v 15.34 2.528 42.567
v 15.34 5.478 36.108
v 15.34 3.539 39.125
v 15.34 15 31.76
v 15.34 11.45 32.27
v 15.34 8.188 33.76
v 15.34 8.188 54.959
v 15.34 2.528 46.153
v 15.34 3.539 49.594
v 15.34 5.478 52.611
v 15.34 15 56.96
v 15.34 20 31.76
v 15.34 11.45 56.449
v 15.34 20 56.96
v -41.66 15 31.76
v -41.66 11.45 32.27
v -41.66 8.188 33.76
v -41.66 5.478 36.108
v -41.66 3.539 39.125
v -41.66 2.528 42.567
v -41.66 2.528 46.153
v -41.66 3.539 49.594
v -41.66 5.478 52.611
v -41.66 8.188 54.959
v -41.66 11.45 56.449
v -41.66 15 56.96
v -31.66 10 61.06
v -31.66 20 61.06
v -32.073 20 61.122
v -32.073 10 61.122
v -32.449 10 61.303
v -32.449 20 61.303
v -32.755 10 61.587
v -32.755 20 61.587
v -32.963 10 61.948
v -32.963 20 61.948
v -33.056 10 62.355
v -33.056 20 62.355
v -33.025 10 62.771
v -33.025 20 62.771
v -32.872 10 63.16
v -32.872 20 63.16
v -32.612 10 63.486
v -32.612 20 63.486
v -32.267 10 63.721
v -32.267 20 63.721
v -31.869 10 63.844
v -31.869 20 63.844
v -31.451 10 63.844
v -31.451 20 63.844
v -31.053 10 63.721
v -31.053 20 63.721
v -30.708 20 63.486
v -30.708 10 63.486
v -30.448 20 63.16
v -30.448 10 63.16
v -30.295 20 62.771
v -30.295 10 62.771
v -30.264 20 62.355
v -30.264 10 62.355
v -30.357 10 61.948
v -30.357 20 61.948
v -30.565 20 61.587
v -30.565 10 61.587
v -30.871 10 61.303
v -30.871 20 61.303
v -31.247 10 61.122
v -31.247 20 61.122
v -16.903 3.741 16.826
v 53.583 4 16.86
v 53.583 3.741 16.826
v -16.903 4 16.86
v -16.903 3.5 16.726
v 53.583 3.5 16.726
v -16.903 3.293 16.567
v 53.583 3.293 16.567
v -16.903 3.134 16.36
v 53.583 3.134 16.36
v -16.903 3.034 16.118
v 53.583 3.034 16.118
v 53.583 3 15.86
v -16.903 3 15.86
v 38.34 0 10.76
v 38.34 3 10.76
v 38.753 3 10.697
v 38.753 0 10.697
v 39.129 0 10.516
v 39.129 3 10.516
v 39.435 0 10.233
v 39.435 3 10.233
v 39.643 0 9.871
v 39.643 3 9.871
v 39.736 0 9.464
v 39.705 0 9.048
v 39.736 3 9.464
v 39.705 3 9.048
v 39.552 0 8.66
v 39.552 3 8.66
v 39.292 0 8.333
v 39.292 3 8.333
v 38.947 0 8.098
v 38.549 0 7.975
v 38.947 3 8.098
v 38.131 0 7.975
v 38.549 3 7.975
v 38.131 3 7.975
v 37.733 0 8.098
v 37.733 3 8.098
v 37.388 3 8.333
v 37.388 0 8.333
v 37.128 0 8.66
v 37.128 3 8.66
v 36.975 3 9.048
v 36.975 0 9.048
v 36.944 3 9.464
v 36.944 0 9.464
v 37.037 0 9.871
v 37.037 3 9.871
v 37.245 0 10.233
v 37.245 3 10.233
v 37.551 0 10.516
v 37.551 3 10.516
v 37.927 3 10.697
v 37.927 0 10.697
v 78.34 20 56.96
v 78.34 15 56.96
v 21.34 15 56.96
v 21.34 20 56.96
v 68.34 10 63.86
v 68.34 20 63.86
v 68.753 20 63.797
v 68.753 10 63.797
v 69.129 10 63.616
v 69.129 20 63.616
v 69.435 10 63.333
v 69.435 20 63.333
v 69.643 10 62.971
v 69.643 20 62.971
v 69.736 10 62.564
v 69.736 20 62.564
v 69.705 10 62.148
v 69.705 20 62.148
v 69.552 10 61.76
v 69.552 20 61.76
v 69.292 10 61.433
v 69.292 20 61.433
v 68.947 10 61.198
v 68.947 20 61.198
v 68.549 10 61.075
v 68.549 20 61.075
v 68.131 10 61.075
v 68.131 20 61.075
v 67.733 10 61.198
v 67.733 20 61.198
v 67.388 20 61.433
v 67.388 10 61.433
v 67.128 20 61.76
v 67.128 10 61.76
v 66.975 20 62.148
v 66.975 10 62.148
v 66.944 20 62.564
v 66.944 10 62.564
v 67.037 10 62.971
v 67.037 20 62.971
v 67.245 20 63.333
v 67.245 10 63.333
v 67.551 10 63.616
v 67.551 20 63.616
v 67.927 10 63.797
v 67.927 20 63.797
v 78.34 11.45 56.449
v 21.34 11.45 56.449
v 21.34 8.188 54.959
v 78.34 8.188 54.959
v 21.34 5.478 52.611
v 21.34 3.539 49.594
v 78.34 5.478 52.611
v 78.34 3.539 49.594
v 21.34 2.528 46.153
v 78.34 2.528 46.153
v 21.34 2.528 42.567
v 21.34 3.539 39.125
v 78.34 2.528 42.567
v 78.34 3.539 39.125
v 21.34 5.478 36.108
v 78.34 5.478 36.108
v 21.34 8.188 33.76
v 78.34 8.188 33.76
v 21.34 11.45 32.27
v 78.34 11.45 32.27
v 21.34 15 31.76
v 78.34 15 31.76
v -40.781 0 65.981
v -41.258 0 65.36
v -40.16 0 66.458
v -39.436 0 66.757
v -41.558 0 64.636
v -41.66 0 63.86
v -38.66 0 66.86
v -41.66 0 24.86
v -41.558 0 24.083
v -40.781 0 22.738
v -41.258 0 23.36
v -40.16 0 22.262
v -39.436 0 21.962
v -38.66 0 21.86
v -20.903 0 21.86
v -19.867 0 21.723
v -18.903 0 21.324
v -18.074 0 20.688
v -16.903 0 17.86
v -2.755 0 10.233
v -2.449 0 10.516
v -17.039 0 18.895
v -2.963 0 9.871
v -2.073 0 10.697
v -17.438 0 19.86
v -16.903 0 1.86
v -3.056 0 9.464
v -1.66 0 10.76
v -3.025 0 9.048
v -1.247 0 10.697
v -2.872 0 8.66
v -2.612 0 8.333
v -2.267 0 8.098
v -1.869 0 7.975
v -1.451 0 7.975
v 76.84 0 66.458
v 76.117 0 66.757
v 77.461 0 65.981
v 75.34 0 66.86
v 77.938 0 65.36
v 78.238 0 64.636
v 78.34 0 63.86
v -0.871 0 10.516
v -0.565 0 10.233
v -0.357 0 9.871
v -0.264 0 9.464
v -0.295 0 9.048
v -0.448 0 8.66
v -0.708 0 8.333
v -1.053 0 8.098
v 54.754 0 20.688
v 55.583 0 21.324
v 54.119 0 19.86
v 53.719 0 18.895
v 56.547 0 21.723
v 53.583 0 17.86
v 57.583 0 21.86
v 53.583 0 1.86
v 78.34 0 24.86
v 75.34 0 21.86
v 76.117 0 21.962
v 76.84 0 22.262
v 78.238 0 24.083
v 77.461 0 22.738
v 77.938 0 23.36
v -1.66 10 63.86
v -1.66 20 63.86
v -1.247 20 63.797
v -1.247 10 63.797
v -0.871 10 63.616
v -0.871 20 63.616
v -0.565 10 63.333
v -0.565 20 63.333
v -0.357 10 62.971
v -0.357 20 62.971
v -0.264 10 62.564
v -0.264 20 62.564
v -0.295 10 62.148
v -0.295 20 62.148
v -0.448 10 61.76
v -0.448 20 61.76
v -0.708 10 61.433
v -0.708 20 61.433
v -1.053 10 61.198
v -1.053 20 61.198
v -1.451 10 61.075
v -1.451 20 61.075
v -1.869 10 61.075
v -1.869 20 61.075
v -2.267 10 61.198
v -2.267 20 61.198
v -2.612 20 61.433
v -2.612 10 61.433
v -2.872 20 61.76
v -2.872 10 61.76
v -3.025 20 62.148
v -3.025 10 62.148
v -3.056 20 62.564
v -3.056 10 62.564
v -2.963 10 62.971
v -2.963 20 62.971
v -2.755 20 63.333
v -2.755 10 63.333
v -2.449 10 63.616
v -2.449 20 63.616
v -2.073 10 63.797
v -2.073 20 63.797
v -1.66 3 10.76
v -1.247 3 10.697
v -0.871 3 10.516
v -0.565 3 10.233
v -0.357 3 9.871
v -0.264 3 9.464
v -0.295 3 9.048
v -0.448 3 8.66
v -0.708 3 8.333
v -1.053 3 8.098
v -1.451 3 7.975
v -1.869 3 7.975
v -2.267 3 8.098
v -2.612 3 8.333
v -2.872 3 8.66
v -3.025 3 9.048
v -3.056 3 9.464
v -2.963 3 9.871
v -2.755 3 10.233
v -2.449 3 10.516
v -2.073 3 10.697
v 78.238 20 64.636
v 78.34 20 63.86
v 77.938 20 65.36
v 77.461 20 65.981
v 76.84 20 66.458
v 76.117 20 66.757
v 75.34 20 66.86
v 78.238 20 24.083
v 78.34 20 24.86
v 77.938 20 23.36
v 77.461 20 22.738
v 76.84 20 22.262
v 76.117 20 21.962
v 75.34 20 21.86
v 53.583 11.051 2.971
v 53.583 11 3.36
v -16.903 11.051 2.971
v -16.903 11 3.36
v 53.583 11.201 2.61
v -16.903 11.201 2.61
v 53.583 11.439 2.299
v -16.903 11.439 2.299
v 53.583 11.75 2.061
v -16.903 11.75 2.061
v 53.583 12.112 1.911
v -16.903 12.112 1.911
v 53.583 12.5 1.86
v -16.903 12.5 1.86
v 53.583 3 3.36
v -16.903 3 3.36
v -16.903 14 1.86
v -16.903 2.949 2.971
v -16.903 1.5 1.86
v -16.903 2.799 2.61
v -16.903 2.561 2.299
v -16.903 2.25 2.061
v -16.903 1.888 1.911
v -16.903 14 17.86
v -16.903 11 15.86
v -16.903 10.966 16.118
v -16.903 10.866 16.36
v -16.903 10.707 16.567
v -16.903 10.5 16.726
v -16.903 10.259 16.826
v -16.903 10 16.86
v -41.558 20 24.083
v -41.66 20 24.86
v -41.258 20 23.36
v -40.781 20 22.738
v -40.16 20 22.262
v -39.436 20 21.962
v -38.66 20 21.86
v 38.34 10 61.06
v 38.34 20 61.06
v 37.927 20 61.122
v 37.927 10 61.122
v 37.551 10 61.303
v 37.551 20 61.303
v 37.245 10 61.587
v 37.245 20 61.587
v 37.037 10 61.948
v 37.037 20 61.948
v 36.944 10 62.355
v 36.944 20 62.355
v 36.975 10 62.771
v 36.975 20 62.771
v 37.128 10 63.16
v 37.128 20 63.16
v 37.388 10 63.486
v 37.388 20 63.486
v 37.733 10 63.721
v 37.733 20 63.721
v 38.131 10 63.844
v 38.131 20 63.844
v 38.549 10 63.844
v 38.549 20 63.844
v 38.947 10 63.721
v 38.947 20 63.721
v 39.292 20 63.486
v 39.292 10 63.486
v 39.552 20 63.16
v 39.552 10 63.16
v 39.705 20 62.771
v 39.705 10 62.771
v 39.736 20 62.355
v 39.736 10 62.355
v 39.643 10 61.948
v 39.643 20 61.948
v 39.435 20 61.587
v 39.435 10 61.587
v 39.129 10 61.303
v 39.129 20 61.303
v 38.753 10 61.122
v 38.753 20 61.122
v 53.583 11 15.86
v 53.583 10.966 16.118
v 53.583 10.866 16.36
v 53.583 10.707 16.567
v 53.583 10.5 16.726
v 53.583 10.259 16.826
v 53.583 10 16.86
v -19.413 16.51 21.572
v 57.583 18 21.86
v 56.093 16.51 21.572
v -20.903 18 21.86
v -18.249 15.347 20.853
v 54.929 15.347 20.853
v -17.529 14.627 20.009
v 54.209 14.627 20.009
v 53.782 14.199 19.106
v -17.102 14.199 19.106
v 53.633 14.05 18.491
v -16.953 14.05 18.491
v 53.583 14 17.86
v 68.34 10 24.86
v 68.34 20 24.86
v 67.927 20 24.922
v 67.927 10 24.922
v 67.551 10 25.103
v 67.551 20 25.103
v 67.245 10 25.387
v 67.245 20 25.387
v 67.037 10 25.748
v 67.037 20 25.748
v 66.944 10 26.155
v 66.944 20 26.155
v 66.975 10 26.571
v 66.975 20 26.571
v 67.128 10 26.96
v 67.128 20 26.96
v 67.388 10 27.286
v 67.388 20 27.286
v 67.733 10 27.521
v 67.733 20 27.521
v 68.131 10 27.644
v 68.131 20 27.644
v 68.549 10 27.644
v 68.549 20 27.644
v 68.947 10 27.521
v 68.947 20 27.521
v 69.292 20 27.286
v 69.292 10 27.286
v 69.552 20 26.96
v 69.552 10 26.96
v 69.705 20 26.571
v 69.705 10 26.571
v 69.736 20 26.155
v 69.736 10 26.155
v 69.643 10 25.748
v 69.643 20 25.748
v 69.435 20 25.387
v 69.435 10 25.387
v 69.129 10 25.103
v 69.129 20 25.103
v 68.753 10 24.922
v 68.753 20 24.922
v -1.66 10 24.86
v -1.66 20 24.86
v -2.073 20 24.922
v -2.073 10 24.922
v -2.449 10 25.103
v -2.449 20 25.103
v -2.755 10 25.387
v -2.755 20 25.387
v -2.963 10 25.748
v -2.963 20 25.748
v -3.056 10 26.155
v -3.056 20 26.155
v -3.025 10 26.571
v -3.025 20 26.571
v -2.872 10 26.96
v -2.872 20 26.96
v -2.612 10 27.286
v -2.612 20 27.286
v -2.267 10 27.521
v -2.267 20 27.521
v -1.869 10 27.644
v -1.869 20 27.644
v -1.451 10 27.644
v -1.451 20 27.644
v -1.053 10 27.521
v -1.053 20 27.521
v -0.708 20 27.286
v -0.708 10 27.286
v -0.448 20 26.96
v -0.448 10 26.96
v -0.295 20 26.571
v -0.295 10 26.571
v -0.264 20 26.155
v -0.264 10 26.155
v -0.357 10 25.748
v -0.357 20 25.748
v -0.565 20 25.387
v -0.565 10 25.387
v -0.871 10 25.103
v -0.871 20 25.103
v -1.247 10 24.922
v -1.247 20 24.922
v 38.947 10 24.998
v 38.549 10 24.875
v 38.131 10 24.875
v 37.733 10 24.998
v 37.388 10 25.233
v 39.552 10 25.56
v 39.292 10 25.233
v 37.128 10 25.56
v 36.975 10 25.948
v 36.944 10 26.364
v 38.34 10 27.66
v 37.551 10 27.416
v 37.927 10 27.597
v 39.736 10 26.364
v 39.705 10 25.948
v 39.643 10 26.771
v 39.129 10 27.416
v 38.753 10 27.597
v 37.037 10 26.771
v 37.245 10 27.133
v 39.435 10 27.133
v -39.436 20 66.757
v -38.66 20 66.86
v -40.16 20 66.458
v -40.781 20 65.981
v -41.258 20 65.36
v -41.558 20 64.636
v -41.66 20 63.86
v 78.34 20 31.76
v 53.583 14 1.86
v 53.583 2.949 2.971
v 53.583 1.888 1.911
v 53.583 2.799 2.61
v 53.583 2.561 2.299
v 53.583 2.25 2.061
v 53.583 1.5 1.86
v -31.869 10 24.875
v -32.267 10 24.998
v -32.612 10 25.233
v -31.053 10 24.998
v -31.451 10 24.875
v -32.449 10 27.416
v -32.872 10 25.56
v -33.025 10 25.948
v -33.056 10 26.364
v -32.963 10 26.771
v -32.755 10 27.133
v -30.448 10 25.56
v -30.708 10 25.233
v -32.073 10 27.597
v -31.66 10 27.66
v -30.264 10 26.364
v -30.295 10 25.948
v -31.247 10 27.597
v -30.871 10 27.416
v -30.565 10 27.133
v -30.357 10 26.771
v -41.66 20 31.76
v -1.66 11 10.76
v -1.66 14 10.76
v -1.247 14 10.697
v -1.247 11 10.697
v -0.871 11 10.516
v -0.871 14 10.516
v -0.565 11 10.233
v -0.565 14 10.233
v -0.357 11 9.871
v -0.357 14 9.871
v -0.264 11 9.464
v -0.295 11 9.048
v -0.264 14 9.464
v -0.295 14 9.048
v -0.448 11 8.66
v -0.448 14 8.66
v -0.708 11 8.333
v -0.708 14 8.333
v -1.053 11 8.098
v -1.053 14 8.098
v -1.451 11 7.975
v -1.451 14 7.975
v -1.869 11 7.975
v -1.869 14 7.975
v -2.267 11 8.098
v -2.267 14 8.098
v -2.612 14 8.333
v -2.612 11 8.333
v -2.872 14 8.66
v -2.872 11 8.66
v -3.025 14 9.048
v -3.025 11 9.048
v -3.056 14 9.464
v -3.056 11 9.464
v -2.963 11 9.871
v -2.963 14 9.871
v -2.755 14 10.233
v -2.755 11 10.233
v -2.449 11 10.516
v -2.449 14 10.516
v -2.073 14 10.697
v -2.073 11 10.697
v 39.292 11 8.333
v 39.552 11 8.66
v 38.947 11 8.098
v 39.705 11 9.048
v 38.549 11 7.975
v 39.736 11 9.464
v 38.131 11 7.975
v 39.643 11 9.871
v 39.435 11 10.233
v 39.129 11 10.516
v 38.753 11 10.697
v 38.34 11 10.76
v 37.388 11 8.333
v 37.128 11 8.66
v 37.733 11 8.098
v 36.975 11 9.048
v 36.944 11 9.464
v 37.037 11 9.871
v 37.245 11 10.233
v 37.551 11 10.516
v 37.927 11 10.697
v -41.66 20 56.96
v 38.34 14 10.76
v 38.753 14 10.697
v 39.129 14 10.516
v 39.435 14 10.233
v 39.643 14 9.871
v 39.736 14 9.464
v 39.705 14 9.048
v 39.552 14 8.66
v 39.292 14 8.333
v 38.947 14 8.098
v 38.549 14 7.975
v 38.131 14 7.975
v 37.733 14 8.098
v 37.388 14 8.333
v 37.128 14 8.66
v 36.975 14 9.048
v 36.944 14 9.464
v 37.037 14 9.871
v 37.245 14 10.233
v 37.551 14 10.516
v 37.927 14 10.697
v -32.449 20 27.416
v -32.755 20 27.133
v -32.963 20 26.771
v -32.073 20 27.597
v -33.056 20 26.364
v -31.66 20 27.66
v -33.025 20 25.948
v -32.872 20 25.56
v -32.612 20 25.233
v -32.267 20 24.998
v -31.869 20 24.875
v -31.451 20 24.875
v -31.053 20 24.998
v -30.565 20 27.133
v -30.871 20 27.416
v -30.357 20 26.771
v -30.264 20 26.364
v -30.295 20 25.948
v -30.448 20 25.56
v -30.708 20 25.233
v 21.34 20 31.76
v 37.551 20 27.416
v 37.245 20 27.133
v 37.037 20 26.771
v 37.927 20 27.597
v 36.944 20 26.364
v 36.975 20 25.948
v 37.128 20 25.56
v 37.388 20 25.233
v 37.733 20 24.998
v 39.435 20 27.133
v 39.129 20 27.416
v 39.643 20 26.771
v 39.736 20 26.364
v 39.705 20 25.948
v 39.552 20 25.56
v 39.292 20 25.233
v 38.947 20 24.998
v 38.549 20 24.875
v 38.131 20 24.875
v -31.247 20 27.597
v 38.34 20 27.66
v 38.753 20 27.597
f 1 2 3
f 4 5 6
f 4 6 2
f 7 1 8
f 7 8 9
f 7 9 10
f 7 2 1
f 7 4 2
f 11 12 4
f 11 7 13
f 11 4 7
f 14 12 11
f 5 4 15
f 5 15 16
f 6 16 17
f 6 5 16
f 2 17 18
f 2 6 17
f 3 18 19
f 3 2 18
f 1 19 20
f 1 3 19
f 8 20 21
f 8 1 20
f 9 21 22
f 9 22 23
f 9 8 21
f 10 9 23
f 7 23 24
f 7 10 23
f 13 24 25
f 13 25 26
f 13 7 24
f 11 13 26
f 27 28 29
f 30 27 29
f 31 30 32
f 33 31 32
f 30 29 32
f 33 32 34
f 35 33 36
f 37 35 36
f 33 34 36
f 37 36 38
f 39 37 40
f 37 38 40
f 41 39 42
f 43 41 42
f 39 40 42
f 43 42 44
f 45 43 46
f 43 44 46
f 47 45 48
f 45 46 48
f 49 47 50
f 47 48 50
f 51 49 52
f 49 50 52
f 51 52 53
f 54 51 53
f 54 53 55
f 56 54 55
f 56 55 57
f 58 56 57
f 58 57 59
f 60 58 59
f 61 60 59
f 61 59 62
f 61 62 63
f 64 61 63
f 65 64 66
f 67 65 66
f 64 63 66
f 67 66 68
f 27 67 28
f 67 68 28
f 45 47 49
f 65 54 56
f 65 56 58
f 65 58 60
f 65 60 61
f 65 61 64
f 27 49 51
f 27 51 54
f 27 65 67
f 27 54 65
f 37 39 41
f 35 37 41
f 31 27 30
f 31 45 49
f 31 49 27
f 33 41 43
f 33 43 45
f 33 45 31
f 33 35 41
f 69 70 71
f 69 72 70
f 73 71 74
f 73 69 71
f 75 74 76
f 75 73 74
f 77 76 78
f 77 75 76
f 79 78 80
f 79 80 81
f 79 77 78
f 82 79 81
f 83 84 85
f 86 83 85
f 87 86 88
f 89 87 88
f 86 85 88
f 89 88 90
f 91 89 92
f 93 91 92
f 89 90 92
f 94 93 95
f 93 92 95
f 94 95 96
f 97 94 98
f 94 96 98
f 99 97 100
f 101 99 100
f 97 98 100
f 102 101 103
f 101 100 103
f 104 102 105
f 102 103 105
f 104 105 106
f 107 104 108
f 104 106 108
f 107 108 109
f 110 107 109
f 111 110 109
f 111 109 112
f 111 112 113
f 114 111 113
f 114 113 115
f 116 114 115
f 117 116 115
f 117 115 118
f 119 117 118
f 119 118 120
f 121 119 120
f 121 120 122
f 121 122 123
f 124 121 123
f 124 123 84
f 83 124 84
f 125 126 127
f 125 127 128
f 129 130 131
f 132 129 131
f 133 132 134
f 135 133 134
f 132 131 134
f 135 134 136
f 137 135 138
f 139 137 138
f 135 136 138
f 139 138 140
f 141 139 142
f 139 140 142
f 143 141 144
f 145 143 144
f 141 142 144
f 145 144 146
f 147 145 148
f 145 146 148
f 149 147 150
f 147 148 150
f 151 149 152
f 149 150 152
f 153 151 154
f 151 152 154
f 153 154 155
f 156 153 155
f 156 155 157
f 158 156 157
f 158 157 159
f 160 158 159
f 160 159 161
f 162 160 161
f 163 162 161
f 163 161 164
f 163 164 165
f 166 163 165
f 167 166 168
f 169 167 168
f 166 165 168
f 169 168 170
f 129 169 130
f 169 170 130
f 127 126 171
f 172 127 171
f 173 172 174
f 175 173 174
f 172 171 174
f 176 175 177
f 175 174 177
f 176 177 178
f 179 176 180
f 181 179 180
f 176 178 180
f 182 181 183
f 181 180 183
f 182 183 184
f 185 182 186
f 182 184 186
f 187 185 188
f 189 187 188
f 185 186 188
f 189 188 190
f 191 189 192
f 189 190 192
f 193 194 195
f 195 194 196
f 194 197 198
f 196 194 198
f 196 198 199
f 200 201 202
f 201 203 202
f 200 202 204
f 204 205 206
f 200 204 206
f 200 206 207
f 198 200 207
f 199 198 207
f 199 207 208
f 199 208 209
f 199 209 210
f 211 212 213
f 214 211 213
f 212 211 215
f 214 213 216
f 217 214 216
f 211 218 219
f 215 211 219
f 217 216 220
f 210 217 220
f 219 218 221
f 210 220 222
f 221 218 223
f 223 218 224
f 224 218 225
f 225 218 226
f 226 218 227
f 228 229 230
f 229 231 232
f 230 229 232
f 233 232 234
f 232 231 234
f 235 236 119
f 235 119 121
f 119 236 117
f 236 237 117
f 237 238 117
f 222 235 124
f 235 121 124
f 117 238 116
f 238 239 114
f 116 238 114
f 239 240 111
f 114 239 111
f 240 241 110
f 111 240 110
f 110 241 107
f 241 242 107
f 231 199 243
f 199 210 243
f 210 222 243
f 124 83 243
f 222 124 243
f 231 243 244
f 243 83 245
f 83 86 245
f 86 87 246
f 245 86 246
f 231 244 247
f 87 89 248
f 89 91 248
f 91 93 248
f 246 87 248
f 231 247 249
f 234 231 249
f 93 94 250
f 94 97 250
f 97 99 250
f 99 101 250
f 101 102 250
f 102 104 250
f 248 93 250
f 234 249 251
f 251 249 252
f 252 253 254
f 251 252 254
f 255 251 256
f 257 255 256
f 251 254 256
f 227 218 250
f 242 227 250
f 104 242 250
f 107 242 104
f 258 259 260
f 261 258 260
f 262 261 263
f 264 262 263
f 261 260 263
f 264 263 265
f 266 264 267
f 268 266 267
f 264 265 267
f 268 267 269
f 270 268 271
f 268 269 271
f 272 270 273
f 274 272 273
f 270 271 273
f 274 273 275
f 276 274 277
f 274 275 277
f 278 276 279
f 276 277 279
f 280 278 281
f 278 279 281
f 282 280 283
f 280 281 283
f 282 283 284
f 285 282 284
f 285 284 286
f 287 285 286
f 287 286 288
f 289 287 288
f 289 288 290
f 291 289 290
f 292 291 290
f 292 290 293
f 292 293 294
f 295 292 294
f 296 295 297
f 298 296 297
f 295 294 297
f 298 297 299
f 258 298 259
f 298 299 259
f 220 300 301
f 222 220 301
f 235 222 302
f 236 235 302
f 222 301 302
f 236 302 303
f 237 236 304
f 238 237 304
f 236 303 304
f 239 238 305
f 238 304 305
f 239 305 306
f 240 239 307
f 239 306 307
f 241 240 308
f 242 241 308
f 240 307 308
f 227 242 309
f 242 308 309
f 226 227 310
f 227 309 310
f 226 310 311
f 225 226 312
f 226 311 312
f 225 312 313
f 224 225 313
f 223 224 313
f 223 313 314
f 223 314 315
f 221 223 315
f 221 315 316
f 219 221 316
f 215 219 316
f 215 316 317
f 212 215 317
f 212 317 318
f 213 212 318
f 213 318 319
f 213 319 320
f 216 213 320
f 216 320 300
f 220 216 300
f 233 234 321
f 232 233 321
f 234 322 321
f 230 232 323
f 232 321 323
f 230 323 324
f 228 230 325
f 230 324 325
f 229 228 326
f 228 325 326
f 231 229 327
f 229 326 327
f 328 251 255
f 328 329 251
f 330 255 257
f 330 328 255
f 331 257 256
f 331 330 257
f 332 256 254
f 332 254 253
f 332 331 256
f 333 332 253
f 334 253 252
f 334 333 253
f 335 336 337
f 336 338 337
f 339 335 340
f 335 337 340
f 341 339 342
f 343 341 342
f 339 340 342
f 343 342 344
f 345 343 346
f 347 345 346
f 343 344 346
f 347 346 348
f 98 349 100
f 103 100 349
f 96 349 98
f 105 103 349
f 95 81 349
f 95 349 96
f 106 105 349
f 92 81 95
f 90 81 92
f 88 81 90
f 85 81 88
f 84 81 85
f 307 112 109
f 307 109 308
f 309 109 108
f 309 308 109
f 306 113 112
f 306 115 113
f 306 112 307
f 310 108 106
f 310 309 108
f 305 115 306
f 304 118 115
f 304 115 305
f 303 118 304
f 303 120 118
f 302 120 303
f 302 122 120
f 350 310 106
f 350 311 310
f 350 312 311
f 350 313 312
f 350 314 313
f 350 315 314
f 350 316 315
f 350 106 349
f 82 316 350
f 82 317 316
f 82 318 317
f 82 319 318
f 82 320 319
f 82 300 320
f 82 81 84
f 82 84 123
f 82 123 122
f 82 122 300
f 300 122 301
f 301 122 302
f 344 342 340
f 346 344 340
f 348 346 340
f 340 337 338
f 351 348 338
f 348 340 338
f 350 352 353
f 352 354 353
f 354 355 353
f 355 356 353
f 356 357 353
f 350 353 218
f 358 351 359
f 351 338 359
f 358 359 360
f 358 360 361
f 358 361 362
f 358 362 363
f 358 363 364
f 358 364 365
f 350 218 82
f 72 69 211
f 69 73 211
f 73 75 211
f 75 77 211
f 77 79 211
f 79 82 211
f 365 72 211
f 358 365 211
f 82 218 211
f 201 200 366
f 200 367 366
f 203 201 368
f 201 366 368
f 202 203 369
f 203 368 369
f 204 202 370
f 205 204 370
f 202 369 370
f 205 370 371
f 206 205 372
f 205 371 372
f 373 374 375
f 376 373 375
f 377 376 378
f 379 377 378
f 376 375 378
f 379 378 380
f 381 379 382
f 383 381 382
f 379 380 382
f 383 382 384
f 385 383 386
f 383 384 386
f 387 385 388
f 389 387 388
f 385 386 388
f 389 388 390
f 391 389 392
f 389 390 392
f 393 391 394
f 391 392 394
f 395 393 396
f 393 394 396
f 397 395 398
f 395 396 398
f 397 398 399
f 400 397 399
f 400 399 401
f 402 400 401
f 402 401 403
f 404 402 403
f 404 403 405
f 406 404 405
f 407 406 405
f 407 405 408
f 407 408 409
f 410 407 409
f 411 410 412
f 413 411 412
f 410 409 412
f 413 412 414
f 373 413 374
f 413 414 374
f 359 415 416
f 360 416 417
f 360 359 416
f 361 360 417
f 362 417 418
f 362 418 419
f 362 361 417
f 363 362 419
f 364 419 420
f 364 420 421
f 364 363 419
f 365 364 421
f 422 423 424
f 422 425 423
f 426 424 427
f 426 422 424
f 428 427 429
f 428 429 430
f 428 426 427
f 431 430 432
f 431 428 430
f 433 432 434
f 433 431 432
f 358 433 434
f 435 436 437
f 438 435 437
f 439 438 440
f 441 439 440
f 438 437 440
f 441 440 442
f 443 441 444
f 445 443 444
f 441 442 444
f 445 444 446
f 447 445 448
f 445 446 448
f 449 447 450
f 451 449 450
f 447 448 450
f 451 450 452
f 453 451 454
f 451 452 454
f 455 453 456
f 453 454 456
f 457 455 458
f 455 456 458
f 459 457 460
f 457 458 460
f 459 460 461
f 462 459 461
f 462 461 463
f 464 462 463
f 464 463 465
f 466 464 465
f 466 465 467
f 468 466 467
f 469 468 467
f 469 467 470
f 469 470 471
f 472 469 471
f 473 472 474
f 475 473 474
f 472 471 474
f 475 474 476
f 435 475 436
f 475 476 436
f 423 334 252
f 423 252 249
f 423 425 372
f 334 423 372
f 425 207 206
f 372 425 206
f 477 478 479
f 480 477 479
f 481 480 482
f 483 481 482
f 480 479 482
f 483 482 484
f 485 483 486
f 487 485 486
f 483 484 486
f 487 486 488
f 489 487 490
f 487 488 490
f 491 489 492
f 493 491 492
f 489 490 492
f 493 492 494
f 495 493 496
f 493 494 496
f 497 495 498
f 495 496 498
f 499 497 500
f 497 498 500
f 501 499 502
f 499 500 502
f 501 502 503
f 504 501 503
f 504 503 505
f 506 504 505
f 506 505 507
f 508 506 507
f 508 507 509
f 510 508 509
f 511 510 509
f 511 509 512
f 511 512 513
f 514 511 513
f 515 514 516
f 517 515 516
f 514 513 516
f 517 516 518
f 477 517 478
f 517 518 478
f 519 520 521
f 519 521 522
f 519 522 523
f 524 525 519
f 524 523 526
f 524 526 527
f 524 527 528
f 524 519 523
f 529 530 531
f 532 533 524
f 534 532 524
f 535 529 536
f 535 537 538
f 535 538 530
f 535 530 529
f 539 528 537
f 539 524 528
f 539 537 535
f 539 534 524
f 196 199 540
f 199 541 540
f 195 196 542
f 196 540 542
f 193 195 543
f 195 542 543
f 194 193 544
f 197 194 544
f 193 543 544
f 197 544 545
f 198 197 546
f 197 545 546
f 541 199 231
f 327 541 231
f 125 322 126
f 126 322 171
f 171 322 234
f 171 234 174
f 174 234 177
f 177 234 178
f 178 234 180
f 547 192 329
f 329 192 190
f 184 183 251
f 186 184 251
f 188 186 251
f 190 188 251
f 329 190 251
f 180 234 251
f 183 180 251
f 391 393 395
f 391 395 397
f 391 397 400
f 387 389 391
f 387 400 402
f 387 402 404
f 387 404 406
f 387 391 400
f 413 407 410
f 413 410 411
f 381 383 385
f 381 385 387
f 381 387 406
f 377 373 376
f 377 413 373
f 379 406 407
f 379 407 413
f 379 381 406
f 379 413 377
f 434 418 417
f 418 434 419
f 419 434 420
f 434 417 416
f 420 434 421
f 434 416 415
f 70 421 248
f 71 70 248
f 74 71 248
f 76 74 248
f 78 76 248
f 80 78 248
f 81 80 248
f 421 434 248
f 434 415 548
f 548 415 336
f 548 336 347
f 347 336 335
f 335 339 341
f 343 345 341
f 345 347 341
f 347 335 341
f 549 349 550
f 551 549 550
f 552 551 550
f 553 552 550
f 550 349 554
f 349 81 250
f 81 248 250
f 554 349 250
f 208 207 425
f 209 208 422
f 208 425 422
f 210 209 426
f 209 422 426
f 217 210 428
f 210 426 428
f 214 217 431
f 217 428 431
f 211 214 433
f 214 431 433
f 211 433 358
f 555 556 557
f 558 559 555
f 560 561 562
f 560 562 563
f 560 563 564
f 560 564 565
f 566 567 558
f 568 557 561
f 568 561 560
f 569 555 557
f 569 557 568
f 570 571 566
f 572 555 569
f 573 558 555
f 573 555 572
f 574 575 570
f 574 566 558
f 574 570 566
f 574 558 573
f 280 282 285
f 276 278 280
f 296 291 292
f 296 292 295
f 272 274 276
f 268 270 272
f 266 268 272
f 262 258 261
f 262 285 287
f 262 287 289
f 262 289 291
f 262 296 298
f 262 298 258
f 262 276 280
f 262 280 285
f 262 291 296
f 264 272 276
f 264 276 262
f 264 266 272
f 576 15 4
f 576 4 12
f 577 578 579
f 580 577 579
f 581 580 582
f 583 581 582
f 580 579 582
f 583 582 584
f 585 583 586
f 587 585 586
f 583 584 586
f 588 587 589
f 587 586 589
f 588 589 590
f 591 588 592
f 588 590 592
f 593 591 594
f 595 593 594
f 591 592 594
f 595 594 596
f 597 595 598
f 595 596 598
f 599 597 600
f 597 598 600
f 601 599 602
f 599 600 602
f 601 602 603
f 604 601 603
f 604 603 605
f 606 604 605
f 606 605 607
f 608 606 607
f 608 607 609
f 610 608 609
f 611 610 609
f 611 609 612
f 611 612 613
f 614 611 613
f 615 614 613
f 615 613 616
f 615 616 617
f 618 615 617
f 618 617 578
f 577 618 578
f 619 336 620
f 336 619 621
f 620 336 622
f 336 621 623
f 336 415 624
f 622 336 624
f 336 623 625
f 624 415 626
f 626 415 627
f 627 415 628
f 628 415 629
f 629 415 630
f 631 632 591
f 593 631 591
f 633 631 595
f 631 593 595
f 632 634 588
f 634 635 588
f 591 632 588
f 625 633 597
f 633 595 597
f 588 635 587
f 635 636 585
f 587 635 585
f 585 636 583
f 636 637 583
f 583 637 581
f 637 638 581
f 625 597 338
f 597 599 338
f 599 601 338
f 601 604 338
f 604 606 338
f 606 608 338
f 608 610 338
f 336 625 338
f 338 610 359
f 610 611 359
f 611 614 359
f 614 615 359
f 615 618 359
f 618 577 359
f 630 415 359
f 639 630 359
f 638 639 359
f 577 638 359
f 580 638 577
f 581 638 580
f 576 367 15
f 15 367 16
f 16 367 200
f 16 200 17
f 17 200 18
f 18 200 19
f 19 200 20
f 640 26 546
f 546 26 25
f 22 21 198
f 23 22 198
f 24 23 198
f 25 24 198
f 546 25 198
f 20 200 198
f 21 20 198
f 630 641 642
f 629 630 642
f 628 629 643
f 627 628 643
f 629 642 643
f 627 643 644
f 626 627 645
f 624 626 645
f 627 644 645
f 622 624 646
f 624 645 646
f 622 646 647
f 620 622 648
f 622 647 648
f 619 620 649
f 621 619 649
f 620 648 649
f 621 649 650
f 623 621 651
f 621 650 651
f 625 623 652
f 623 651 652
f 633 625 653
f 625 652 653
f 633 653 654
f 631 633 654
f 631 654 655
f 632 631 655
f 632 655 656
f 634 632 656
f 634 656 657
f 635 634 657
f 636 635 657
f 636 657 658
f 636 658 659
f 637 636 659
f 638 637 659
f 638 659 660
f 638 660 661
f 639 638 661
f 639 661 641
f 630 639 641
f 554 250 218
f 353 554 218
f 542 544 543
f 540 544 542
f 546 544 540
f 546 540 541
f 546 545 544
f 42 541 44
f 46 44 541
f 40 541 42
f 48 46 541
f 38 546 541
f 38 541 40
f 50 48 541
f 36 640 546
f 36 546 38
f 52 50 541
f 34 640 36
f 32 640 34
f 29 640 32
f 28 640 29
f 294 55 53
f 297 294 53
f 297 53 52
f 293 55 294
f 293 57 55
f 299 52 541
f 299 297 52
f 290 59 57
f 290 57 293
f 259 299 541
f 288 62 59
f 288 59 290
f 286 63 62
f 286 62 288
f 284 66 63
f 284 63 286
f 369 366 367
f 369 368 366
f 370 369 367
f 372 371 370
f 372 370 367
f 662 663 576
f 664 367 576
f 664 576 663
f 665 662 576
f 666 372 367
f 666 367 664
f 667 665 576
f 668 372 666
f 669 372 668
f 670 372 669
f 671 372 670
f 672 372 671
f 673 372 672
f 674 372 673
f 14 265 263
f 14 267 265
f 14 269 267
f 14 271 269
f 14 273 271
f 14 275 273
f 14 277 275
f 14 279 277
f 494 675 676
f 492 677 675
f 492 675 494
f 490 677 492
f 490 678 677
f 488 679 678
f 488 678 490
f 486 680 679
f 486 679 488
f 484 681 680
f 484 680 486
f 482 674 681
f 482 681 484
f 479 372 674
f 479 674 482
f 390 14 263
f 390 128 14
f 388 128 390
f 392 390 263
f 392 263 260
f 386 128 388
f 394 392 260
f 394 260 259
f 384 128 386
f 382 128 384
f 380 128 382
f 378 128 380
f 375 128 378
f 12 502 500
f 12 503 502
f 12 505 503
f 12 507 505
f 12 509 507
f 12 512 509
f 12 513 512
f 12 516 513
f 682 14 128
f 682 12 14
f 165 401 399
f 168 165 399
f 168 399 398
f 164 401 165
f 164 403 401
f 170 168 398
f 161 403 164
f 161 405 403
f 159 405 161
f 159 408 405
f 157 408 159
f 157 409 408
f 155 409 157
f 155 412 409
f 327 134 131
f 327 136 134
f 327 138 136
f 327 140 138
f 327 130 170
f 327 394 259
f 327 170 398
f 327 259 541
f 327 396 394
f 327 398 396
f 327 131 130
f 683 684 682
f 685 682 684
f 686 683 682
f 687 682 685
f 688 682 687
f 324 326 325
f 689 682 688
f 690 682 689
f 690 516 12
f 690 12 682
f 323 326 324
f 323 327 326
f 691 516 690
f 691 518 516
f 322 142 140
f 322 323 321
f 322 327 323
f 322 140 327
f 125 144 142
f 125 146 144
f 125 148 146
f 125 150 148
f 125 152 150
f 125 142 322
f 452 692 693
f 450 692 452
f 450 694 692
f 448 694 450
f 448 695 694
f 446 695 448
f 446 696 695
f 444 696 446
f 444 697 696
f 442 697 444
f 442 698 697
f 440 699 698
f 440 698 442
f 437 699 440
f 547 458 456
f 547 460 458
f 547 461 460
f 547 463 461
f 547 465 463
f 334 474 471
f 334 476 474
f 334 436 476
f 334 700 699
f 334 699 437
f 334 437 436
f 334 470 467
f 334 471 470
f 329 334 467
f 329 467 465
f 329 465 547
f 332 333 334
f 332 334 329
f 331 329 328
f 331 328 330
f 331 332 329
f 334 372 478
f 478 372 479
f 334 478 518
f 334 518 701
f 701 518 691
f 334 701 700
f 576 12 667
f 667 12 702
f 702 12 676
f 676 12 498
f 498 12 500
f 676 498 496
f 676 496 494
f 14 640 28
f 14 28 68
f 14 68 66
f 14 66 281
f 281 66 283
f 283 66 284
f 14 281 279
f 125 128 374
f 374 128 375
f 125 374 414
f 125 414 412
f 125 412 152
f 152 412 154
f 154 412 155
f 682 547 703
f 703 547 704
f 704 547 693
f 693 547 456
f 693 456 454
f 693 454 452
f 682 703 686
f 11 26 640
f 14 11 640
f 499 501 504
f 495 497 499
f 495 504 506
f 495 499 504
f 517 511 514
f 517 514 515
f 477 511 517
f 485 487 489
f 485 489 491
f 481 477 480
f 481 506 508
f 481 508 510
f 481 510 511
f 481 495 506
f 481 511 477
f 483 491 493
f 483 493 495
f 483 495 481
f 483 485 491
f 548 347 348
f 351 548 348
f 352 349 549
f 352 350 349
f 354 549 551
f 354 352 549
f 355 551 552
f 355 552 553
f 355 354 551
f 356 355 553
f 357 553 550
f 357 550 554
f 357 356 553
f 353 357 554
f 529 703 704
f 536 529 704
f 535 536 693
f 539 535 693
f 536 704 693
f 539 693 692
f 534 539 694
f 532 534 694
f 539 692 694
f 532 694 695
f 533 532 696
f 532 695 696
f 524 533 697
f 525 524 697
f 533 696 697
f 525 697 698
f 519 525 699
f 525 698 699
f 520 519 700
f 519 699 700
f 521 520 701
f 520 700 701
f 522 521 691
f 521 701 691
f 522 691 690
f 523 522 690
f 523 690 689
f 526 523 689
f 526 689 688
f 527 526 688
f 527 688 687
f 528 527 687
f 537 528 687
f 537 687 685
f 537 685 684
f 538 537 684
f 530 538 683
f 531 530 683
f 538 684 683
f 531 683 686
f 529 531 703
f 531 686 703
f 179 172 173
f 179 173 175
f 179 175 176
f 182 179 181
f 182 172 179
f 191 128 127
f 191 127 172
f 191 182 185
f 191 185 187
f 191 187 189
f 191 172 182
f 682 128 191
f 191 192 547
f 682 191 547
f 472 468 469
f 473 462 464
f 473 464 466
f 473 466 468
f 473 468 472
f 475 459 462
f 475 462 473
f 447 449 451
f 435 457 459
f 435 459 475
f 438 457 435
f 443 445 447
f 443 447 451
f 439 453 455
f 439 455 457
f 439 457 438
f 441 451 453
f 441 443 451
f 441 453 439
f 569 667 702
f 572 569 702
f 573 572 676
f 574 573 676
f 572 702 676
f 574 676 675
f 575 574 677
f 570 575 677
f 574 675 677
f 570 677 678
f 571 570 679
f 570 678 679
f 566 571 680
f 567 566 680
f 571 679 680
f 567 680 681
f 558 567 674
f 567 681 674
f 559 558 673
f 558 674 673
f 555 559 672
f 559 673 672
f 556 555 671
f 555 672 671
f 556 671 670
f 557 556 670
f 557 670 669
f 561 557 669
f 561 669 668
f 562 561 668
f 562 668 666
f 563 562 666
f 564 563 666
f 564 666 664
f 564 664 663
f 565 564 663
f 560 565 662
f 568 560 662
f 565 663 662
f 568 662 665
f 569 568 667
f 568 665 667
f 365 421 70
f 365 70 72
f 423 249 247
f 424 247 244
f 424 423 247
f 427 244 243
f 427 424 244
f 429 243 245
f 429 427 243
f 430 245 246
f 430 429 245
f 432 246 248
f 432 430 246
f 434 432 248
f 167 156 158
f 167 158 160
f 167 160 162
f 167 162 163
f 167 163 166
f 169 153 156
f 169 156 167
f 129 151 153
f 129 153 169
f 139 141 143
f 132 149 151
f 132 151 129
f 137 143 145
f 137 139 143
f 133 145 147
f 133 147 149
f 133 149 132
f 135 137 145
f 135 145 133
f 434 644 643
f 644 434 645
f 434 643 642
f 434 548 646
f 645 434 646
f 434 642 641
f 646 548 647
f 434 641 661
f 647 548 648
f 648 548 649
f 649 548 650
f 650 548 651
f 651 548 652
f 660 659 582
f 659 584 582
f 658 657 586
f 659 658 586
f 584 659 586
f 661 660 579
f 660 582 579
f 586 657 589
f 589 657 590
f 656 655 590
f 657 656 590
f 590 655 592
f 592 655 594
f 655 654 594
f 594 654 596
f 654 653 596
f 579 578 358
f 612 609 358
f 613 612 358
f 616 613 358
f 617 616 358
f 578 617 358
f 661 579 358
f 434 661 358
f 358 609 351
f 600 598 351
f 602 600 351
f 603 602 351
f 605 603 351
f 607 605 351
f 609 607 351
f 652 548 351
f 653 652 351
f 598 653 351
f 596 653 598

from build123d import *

# Parameters (mm, degrees)
BOSS_EXTRUDE1_DEPTH     = 20
CUT_EXTRUDE1_DEPTH      = 57
CUT_EXTRUDE2_START      = -57
CUT_EXTRUDE2_DEPTH      = 57
SKETCH12_W              = 70.48528137
SKETCH12_H              = 6
CUT_EXTRUDE3_DEPTH      = 20
CUT_EXTRUDE4_DEPTH      = 104.740847077
CUT_EXTRUDE4_DEPTH_BACK = 15
SKETCH12_7_OUTSIDE_W    = 149.586
SKETCH12_7_OUTSIDE_H    = 49.586
SKETCH12_7_OUTSIDE_W_2  = 70.48528137
SKETCH12_7_OUTSIDE_H_2  = 3
SKETCH16_W              = 25.2
SKETCH16_H              = 5
CUT_EXTRUDE8_DEPTH      = 57
SKETCH18_R              = 1.4
CUT_EXTRUDE11_DEPTH     = 10
FILLET2_R               = 1
FILLET3_R               = 1.5
SKETCH20_W              = 25.2
SKETCH20_H              = 5
CUT_EXTRUDE12_DEPTH     = 57
FILLET5_R               = 3
FILLET6_R               = 4
SKETCH21_R              = 1.4
CUT_EXTRUDE13_DEPTH     = 20


with BuildPart() as part:
    # Sketch2 → Boss-Extrude1 (new body)
    with BuildSketch(Plane(origin=(0, 0, 0), x_dir=(1, 0, 0), z_dir=(0, 1, 0))):
        Polygon((-41.659950522, -21.859673837), (-41.659950522, -66.859673837), (78.340049478, -66.859673837), (78.340049478, -21.859673837), (53.582690163, -21.859673837), (53.582690163, -1.859673837), (-16.902591207, -1.859673837), (-16.902591207, -21.859673837), align=None)
    extrude(amount=BOSS_EXTRUDE1_DEPTH)

    # Sketch3 → Cut-Extrude1 (cut)
    with BuildSketch(Plane(origin=(78.340049478, 0, 0), x_dir=(0, 0, -1), z_dir=(1, 0, 0))):
        with BuildLine():
            ThreePointArc((-55.925139673, 20), (-46.912626096, 2.661343883), (-31.759673837, 15))
            ThreePointArc((-31.759673837, 15), (-32.02101772, 17.552952259), (-32.794208001, 20))
            Line((-32.794208001, 20), (-55.925139673, 20))
        make_face()
    extrude(amount=-CUT_EXTRUDE1_DEPTH, mode=Mode.SUBTRACT)

    # Sketch5 → Cut-Extrude2 (cut)
    with BuildSketch(Plane.ZY.offset(41.659950522).offset(CUT_EXTRUDE2_START)):
        with BuildLine():
            ThreePointArc((32.794208001, 20), (41.806721579, 2.661343883), (56.959673837, 15))
            ThreePointArc((56.959673837, 15), (56.698329954, 17.552952259), (55.925139673, 20))
            Line((55.925139673, 20), (32.794208001, 20))
        make_face()
    extrude(amount=CUT_EXTRUDE2_DEPTH, mode=Mode.SUBTRACT)

    # Sketch12 → Cut-Extrude3 (cut)
    with BuildSketch(Plane(origin=(0, 0, 1.859673837), x_dir=(-1, 0, 0), z_dir=(0, 0, -1))):
        with Locations((-18.340049478, 17)):
            Rectangle(SKETCH12_W, SKETCH12_H)
    extrude(amount=-CUT_EXTRUDE3_DEPTH, mode=Mode.SUBTRACT)

    # Sketch12<7> outside → Cut-Extrude4 (cut, two sides: drawn at the far end of the back side and taken through both)
    with BuildSketch(Plane(origin=(0, 0, 1.859673837), x_dir=(-1, 0, 0), z_dir=(0, 0, -1)).offset(-CUT_EXTRUDE4_DEPTH_BACK)):
        with Locations((-18.34, 10)):
            Rectangle(SKETCH12_7_OUTSIDE_W, SKETCH12_7_OUTSIDE_H)
        with Locations((-18.340049478, 1.5)):
            Rectangle(SKETCH12_7_OUTSIDE_W_2, SKETCH12_7_OUTSIDE_H_2, mode=Mode.SUBTRACT)
        with Locations((-18.340049478, 12.5)):
            Rectangle(SKETCH12_7_OUTSIDE_W_2, SKETCH12_7_OUTSIDE_H_2, mode=Mode.SUBTRACT)
    extrude(amount=CUT_EXTRUDE4_DEPTH + CUT_EXTRUDE4_DEPTH_BACK, mode=Mode.SUBTRACT)

    # Sketch16 → Cut-Extrude8 (cut)
    with BuildSketch(Plane.ZY.offset(41.659950522)):
        with Locations((44.359673837, 17.5)):
            Rectangle(SKETCH16_W, SKETCH16_H)
    extrude(amount=-CUT_EXTRUDE8_DEPTH, mode=Mode.SUBTRACT)

    # Sketch18 → Cut-Extrude11 (cut)
    with BuildSketch(Plane(origin=(0, 20, 0), x_dir=(1, 0, 0), z_dir=(0, 1, 0))):
        with Locations((-31.659950522, -26.259673837)):
            Circle(SKETCH18_R)
        with Locations((-1.659950522, -26.259673837)):
            Circle(SKETCH18_R)
        with Locations((-1.659950522, -62.459673837)):
            Circle(SKETCH18_R)
        with Locations((-31.659950522, -62.459673837)):
            Circle(SKETCH18_R)
        with Locations((38.340049478, -62.459673837)):
            Circle(SKETCH18_R)
        with Locations((68.340049478, -62.459673837)):
            Circle(SKETCH18_R)
        with Locations((38.340049478, -26.259673837)):
            Circle(SKETCH18_R)
        with Locations((68.340049478, -26.259673837)):
            Circle(SKETCH18_R)
    extrude(amount=-CUT_EXTRUDE11_DEPTH, mode=Mode.SUBTRACT)

    # Fillet2
    fillet2_edges = [part.edges().sort_by_distance(p)[0] for p in [
        (18.340049478, 3, 16.859673837),
        (18.340049478, 11, 16.859673837),
    ]]
    fillet(fillet2_edges, radius=FILLET2_R)

    # Fillet3
    fillet3_edges = [part.edges().sort_by_distance(p)[0] for p in [
        (18.340049478, 3, 1.859673837),
        (18.340049478, 11, 1.859673837),
    ]]
    fillet(fillet3_edges, radius=FILLET3_R)

    # Sketch20 → Cut-Extrude12 (cut)
    with BuildSketch(Plane(origin=(78.340049478, 0, 0), x_dir=(0, 0, -1), z_dir=(1, 0, 0))):
        with Locations((-44.359673837, 17.5)):
            Rectangle(SKETCH20_W, SKETCH20_H)
    extrude(amount=-CUT_EXTRUDE12_DEPTH, mode=Mode.SUBTRACT)

    # Fillet5
    fillet5_edges = [part.edges().sort_by_distance(p)[0] for p in [
        (78.340049478, 10, 66.859673837),
        (78.340049478, 10, 21.859673837),
        (-41.659950522, 10, 21.859673837),
        (-41.659950522, 10, 66.859673837),
    ]]
    fillet(fillet5_edges, radius=FILLET5_R)

    # Fillet6
    fillet6_edges = [part.edges().sort_by_distance(p)[0] for p in [
        (53.582690163, 7, 21.859673837),
        (-16.902591207, 7, 21.859673837),
        (18.340049478, 14, 21.859673837),
    ]]
    fillet(fillet6_edges, radius=FILLET6_R)

    # Sketch21 → Cut-Extrude13 (cut)
    with BuildSketch(Plane(origin=(0, 14, 0), x_dir=(1, 0, 0), z_dir=(0, 1, 0))):
        with Locations((38.340049478, -9.359673837)):
            Circle(SKETCH21_R)
        with Locations((-1.659950522, -9.359673837)):
            Circle(SKETCH21_R)
    extrude(amount=-CUT_EXTRUDE13_DEPTH, mode=Mode.SUBTRACT)


solid = part.part
